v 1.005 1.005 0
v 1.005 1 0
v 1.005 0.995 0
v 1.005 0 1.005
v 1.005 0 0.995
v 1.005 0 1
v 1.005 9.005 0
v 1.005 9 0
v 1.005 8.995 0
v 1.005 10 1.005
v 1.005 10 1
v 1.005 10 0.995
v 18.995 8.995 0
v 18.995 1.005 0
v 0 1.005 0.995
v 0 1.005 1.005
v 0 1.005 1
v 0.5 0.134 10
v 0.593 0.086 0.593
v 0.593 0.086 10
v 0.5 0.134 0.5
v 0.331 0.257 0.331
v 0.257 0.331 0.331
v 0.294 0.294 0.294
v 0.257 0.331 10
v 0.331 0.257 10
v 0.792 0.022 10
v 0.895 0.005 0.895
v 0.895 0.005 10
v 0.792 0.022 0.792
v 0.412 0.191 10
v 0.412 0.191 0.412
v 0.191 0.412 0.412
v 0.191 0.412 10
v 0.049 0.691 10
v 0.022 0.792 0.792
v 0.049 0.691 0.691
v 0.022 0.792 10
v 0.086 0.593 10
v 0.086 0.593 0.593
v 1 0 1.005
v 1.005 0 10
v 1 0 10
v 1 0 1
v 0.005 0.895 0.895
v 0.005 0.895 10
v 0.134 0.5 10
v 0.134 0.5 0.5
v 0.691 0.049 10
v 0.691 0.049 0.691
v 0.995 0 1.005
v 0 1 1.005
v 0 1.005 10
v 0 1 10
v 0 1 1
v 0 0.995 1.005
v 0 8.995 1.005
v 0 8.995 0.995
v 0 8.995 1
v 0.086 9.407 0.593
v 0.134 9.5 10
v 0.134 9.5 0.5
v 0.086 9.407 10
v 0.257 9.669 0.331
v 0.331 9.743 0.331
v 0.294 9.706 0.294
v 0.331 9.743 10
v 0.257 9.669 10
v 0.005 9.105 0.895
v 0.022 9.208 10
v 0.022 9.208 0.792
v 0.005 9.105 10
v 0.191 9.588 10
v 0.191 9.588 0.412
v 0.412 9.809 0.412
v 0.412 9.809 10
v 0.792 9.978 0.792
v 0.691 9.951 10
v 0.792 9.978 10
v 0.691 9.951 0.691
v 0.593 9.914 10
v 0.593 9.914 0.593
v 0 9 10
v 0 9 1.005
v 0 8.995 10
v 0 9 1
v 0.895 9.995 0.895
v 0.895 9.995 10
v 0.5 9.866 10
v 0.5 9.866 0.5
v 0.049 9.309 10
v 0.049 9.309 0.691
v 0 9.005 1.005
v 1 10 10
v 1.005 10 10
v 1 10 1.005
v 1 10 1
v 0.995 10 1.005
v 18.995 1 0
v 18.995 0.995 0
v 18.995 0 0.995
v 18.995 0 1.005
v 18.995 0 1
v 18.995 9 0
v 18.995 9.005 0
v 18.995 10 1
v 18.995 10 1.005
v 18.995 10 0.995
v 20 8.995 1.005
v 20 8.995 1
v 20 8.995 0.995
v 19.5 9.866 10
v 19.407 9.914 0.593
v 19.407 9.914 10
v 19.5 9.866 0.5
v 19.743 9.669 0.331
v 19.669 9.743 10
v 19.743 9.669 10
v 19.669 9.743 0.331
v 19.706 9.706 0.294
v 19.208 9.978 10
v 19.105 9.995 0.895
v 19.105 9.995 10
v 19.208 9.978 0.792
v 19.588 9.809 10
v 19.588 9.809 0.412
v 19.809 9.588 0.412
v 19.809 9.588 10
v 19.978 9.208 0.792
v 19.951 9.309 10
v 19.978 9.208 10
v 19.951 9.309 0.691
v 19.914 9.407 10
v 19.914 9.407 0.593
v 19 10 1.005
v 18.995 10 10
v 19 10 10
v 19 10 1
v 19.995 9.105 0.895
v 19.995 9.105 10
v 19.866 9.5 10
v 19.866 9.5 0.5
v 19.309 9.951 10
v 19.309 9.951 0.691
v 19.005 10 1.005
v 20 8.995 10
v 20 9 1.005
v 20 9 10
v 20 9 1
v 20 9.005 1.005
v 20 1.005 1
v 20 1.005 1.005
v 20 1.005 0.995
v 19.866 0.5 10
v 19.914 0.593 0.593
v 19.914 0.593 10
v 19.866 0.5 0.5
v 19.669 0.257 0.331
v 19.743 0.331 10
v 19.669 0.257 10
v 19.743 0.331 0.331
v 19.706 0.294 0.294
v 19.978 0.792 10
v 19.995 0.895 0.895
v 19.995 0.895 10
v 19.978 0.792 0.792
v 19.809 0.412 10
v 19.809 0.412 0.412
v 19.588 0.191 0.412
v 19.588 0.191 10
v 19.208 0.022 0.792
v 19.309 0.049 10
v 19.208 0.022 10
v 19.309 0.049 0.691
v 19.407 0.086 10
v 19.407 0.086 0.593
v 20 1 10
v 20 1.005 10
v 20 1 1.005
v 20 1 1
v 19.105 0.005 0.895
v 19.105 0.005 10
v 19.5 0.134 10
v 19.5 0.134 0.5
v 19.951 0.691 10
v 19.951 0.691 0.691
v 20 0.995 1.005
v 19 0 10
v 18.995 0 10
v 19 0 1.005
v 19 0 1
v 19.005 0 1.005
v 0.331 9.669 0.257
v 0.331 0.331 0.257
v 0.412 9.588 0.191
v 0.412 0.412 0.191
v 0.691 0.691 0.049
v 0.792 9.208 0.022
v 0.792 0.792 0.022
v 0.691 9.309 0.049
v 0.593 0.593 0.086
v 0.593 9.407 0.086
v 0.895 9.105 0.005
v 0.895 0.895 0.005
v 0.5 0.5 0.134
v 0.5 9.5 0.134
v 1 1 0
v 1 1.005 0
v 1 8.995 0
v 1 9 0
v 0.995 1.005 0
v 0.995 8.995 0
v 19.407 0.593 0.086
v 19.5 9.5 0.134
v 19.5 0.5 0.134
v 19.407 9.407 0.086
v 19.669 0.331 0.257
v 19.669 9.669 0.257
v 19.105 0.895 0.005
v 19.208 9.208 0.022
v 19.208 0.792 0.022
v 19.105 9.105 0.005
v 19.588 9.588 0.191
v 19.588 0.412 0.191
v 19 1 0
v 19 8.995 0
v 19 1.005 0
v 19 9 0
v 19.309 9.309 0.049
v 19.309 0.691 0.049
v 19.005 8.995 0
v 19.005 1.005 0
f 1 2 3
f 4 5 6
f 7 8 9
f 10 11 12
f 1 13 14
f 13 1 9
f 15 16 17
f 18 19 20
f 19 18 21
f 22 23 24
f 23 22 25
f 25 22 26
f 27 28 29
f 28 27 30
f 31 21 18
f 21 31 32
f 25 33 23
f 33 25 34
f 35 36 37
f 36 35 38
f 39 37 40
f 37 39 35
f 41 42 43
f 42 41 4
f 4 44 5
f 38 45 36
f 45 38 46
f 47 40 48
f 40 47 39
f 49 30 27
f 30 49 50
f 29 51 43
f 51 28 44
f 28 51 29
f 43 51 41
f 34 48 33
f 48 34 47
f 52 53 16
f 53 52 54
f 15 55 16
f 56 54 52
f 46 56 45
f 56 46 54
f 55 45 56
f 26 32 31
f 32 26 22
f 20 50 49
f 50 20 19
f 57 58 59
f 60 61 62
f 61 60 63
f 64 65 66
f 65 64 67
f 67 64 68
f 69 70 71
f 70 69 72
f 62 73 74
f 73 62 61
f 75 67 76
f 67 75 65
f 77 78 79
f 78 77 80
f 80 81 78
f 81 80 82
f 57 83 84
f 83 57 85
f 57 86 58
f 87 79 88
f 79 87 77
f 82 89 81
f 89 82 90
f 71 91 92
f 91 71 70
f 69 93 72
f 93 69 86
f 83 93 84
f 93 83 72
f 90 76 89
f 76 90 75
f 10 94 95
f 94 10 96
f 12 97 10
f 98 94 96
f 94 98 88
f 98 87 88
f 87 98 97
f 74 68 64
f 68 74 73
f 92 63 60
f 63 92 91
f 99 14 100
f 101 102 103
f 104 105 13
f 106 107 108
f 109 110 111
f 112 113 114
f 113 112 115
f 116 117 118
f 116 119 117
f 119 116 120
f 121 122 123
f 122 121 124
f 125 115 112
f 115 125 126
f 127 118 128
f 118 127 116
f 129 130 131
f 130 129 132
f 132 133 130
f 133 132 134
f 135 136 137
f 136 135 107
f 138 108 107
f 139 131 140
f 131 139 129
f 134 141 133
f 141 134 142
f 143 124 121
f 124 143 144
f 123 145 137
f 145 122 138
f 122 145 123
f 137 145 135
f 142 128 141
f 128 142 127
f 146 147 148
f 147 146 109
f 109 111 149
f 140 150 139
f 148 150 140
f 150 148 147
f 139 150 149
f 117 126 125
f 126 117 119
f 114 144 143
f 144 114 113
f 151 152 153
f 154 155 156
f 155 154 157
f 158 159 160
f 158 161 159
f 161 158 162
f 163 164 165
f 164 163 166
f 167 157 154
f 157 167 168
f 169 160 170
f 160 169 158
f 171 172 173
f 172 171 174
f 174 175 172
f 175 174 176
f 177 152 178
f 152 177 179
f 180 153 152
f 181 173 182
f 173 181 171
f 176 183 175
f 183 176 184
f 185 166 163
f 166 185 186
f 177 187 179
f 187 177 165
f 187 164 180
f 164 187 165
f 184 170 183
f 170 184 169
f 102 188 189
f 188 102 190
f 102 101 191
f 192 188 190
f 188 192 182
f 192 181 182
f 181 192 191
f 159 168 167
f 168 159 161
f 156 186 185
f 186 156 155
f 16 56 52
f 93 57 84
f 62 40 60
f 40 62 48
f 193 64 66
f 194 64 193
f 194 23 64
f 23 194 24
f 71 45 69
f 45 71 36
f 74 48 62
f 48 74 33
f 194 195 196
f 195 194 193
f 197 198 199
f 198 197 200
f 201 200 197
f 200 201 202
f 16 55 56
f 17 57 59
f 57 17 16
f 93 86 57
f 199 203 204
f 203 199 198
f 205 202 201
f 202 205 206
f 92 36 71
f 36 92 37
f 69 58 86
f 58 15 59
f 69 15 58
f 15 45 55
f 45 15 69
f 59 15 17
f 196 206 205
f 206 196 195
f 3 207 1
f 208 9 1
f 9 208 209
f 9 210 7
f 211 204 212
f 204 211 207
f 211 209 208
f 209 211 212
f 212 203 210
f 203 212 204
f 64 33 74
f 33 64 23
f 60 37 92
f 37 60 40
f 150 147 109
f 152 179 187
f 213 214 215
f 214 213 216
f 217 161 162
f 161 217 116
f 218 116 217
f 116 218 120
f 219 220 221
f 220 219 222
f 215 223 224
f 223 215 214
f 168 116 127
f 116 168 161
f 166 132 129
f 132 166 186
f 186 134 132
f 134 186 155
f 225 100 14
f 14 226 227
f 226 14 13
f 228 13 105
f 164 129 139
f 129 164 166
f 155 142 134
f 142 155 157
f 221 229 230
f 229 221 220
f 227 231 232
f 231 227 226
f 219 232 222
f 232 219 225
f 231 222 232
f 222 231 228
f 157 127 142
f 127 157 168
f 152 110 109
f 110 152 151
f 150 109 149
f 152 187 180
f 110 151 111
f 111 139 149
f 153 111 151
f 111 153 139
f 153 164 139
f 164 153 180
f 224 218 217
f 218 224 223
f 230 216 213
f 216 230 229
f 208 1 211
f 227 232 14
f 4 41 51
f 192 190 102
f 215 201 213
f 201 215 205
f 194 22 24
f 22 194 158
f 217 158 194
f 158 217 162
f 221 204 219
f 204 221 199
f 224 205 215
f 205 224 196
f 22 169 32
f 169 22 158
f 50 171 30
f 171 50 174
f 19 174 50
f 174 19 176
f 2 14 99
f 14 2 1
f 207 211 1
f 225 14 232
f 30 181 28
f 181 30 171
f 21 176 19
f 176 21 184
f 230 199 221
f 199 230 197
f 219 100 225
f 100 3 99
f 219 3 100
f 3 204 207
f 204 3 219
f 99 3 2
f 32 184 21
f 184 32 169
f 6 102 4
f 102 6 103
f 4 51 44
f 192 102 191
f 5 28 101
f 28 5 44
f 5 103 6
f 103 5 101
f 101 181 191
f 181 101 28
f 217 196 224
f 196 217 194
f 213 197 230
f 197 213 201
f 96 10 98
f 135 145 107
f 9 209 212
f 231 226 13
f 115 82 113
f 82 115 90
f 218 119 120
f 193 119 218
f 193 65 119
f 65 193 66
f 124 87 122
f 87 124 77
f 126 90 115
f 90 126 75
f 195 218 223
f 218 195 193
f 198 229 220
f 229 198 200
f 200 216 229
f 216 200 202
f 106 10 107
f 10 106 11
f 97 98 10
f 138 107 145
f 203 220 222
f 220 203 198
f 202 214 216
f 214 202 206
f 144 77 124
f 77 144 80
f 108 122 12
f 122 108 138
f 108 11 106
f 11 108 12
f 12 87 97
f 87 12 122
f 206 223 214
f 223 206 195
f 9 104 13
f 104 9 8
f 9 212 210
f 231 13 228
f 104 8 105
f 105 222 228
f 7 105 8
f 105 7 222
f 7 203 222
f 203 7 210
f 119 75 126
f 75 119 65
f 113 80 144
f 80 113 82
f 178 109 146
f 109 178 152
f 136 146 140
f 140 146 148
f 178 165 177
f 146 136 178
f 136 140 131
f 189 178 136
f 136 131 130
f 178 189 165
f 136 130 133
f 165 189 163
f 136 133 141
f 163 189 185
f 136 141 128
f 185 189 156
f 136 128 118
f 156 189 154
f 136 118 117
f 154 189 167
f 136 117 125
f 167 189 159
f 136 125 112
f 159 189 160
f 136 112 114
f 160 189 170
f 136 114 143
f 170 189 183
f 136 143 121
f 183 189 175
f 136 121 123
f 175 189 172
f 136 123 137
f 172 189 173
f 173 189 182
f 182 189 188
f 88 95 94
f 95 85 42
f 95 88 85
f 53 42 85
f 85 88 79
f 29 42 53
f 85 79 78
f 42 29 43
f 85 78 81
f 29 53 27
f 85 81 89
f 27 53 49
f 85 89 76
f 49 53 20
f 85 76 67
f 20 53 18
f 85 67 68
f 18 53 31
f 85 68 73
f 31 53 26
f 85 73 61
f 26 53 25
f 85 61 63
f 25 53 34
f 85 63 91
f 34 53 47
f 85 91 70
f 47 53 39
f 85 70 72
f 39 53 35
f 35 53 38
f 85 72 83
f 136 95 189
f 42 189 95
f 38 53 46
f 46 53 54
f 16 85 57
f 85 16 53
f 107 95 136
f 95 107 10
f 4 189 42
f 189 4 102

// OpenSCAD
RoundCube([20, 10, 10], center = false, radius = 1);

module RoundCube(size = [1, 1, 1], center = false,radius = 1.5,fn=60, round_top=true){

    obj_translate = (center == false) 
        ? [0, 0, 0] 
        : [ -(size[0] / 2),
            -(size[1] / 2),
            - (size[2] / 2)
          ];
    x = size[0];
    y = size[1];
    z = size[2];
    echo (obj_translate);
    translate(obj_translate) 
    {
        echo("obj_translate=",obj_translate);
        difference()
        {
            // do Z 
            cube(size, center=false); 
            translate([0,0,0]) fillet(0,r=radius,h=z*2, $fn=fn);
            translate([0,y-radius,0]) fillet(-90,r=radius,h=z*2, $fn=fn);
            translate([x-radius,y-radius,0]) fillet(180,r=radius,h=z*2, $fn=fn);
            translate([x-radius,0,0]) fillet(90,r=radius,h=z*2, $fn=fn);
            // do Y bottom
            translate([0,0,radius]) rotate([-90,0,0]) fillet(-90,r=radius,h=y*2, $fn=fn);
            translate([x-radius,0,radius]) rotate([-90,0,0]) fillet(180,r=radius,h=y*2, $fn=fn);
            // do X bottom
            translate([0,0,radius]) rotate([0,90,0]) fillet(90,r=radius,h=x*2, $fn=fn);
            translate([0,y-radius,radius]) rotate([0,90,0]) fillet(180,r=radius,h=x*2, $fn=fn);
            // do tops TBD not needed yet
            //if (round_top == true)
                // do Y top
                // do X top
                

        }
        
    }
}

module fillet(rot, r=1, h=10) {
    translate([r / 2, r / 2, h/2])
    rotate([0,0,rot]) difference() {
        cube([r + 0.01, r + 0.01, h], center = true);
        translate([r/2, r/2, 0])
            cylinder(r = r, h = h + 1, center = true);
    }
}
